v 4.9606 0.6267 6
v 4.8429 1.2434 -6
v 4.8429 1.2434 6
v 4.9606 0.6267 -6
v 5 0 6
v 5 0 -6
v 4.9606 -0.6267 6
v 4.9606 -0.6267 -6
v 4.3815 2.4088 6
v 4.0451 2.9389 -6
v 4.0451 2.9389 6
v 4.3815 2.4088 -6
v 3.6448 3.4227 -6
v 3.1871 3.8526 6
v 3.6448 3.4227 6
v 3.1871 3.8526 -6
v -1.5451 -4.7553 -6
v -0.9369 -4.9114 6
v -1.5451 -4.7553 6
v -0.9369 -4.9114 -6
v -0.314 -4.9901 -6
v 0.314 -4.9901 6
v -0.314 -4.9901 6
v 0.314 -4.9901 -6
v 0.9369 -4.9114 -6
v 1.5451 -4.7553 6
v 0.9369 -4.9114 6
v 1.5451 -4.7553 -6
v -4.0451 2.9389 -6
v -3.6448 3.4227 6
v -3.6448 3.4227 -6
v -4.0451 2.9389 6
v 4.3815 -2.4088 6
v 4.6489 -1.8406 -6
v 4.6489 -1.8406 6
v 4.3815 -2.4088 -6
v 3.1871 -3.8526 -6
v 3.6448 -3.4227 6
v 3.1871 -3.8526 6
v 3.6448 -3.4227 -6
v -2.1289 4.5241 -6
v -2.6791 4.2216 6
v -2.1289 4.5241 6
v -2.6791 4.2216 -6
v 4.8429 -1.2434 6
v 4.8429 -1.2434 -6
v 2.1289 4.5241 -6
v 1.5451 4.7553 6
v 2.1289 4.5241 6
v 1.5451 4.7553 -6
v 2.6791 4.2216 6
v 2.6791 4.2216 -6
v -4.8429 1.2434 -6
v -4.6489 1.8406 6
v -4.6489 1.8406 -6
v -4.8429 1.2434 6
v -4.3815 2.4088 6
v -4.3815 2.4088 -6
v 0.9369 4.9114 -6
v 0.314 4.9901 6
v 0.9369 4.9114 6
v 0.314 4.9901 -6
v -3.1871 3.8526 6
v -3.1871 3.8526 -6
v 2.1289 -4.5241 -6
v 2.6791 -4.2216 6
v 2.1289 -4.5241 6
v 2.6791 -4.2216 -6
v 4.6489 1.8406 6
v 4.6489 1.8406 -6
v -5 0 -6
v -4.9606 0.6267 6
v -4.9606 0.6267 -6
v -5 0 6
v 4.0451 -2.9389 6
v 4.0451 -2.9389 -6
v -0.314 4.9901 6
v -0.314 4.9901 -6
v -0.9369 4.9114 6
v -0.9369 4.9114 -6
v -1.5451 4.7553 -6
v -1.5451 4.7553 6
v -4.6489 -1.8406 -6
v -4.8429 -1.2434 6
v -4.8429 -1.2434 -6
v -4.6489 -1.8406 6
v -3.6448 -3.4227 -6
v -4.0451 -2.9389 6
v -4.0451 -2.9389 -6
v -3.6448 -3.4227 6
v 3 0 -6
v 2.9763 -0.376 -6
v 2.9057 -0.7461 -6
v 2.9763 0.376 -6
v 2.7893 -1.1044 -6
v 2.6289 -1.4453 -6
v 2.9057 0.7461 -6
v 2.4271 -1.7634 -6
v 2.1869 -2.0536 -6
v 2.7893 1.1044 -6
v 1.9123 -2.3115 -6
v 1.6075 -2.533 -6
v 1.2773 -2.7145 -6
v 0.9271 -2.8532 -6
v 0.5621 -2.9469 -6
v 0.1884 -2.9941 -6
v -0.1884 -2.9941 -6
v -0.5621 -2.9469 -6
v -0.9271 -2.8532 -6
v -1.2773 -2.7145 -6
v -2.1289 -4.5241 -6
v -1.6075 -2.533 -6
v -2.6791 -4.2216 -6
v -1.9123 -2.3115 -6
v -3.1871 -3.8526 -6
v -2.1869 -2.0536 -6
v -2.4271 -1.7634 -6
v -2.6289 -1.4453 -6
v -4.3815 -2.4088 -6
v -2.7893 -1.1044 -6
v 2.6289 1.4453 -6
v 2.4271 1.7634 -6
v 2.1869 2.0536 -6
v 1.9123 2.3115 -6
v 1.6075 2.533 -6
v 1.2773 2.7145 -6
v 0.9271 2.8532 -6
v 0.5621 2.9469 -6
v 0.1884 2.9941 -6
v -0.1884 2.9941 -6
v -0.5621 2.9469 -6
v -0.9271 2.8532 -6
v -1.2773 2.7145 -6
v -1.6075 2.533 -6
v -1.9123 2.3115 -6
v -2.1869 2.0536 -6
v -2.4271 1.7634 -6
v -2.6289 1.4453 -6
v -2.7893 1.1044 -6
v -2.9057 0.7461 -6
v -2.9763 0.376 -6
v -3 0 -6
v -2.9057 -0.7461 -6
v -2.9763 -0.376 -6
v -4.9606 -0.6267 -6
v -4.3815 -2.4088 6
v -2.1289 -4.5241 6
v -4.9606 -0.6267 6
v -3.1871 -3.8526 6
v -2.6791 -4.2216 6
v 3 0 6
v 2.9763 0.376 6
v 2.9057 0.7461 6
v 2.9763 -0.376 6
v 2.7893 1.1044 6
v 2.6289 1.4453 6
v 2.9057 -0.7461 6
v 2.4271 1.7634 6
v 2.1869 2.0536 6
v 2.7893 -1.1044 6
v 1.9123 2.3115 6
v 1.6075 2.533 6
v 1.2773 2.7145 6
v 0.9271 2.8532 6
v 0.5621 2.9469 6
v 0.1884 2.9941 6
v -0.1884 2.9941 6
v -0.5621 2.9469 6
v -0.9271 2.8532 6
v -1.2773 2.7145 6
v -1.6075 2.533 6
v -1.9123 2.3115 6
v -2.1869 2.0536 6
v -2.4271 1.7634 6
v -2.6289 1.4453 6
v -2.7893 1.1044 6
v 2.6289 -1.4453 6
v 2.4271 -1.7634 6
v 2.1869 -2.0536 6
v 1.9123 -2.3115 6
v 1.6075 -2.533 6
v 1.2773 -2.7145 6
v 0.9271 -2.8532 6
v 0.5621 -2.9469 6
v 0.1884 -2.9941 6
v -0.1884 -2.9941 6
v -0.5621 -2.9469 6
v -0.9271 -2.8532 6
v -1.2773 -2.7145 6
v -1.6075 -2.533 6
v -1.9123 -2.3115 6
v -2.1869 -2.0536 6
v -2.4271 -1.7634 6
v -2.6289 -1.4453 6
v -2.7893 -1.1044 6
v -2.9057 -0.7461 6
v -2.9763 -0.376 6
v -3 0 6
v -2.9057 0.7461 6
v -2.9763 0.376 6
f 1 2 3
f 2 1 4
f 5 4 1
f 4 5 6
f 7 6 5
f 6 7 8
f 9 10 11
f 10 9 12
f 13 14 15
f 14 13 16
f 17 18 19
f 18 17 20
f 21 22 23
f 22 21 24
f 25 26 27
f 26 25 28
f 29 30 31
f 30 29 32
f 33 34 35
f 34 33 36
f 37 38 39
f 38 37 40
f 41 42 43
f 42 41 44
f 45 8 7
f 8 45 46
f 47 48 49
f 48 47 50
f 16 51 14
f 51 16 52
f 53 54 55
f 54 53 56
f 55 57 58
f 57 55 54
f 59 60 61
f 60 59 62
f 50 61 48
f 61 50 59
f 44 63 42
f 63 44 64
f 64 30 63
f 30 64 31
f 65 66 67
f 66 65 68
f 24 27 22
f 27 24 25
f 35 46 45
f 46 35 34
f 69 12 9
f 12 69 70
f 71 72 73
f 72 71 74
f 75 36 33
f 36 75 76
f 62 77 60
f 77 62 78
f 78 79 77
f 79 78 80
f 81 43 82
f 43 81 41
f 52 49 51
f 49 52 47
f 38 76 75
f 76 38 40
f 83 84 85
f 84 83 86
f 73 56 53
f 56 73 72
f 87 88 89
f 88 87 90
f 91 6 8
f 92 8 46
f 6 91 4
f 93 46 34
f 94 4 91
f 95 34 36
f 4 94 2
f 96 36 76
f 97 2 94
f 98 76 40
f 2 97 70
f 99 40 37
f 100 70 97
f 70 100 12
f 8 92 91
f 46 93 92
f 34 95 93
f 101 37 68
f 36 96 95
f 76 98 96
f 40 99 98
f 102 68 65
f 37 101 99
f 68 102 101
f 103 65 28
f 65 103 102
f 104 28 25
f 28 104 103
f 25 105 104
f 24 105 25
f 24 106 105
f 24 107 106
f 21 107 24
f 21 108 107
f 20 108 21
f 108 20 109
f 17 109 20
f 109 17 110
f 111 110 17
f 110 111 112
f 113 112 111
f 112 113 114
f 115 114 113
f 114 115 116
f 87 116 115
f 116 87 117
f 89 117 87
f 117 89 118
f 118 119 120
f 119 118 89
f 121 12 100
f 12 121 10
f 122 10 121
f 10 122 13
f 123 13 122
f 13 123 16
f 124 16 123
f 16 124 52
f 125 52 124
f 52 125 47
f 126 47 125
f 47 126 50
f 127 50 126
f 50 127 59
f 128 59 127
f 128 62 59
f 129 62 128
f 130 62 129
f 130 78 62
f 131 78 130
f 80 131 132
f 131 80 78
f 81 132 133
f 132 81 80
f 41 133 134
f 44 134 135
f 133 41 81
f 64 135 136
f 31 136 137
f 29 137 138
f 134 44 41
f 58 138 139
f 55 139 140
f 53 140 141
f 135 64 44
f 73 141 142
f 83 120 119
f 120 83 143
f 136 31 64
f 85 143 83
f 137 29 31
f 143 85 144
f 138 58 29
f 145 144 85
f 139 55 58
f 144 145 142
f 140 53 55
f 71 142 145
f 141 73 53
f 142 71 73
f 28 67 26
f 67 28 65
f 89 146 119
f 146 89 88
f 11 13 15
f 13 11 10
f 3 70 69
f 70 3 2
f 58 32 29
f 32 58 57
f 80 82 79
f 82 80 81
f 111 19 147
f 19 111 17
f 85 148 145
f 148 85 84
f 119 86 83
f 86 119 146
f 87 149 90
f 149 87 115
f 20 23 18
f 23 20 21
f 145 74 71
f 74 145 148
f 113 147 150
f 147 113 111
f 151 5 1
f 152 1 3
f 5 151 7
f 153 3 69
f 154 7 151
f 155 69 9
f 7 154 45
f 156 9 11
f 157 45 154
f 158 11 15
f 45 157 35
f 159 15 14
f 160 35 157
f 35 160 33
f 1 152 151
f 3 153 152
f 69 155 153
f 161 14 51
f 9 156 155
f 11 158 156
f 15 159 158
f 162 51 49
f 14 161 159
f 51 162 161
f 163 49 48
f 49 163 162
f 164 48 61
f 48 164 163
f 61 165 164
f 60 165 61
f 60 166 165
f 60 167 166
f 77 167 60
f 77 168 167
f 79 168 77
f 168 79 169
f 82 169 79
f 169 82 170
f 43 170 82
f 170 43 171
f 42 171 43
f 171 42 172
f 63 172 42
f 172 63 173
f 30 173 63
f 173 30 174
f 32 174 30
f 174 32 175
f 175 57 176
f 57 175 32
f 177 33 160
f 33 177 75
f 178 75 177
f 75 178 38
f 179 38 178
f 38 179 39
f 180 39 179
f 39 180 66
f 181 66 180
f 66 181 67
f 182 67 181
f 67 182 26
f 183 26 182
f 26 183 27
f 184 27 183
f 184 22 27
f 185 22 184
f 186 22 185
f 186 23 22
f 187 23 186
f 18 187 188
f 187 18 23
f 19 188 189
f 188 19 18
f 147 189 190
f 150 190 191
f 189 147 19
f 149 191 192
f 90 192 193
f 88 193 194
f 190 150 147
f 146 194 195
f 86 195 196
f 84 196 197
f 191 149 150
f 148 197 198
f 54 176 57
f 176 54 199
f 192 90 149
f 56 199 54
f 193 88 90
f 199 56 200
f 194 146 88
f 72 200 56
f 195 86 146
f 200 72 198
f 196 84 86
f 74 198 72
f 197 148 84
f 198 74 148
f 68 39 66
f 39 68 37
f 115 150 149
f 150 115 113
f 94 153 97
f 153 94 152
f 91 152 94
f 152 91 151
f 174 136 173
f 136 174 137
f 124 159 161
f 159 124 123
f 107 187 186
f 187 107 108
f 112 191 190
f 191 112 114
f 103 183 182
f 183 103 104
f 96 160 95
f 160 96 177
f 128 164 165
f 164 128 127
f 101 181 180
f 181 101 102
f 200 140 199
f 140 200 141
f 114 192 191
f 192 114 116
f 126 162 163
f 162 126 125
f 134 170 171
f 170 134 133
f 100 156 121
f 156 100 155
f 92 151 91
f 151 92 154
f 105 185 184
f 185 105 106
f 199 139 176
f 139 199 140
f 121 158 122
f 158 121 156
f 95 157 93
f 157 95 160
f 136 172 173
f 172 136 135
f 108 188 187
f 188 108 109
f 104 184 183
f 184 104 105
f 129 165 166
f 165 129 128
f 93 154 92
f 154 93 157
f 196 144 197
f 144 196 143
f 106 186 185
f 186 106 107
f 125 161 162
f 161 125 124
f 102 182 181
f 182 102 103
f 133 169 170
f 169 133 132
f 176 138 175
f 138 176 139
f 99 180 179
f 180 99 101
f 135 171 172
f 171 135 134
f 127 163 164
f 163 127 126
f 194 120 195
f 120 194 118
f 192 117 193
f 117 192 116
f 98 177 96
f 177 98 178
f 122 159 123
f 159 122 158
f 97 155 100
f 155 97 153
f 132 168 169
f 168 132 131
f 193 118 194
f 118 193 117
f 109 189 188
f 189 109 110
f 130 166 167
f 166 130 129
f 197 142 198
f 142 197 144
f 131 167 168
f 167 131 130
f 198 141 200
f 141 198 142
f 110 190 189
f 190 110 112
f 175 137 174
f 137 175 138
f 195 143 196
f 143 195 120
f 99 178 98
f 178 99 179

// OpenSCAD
$fn = 50;


difference() {
	union() {
		translate(v = [0, 0, -6.0000000000]) {
			cylinder(h = 12, r = 5.0000000000);
		}
	}
	union() {
		translate(v = [0, 0, -100.0000000000]) {
			cylinder(h = 200, r = 3.0000000000);
		}
	}
}
